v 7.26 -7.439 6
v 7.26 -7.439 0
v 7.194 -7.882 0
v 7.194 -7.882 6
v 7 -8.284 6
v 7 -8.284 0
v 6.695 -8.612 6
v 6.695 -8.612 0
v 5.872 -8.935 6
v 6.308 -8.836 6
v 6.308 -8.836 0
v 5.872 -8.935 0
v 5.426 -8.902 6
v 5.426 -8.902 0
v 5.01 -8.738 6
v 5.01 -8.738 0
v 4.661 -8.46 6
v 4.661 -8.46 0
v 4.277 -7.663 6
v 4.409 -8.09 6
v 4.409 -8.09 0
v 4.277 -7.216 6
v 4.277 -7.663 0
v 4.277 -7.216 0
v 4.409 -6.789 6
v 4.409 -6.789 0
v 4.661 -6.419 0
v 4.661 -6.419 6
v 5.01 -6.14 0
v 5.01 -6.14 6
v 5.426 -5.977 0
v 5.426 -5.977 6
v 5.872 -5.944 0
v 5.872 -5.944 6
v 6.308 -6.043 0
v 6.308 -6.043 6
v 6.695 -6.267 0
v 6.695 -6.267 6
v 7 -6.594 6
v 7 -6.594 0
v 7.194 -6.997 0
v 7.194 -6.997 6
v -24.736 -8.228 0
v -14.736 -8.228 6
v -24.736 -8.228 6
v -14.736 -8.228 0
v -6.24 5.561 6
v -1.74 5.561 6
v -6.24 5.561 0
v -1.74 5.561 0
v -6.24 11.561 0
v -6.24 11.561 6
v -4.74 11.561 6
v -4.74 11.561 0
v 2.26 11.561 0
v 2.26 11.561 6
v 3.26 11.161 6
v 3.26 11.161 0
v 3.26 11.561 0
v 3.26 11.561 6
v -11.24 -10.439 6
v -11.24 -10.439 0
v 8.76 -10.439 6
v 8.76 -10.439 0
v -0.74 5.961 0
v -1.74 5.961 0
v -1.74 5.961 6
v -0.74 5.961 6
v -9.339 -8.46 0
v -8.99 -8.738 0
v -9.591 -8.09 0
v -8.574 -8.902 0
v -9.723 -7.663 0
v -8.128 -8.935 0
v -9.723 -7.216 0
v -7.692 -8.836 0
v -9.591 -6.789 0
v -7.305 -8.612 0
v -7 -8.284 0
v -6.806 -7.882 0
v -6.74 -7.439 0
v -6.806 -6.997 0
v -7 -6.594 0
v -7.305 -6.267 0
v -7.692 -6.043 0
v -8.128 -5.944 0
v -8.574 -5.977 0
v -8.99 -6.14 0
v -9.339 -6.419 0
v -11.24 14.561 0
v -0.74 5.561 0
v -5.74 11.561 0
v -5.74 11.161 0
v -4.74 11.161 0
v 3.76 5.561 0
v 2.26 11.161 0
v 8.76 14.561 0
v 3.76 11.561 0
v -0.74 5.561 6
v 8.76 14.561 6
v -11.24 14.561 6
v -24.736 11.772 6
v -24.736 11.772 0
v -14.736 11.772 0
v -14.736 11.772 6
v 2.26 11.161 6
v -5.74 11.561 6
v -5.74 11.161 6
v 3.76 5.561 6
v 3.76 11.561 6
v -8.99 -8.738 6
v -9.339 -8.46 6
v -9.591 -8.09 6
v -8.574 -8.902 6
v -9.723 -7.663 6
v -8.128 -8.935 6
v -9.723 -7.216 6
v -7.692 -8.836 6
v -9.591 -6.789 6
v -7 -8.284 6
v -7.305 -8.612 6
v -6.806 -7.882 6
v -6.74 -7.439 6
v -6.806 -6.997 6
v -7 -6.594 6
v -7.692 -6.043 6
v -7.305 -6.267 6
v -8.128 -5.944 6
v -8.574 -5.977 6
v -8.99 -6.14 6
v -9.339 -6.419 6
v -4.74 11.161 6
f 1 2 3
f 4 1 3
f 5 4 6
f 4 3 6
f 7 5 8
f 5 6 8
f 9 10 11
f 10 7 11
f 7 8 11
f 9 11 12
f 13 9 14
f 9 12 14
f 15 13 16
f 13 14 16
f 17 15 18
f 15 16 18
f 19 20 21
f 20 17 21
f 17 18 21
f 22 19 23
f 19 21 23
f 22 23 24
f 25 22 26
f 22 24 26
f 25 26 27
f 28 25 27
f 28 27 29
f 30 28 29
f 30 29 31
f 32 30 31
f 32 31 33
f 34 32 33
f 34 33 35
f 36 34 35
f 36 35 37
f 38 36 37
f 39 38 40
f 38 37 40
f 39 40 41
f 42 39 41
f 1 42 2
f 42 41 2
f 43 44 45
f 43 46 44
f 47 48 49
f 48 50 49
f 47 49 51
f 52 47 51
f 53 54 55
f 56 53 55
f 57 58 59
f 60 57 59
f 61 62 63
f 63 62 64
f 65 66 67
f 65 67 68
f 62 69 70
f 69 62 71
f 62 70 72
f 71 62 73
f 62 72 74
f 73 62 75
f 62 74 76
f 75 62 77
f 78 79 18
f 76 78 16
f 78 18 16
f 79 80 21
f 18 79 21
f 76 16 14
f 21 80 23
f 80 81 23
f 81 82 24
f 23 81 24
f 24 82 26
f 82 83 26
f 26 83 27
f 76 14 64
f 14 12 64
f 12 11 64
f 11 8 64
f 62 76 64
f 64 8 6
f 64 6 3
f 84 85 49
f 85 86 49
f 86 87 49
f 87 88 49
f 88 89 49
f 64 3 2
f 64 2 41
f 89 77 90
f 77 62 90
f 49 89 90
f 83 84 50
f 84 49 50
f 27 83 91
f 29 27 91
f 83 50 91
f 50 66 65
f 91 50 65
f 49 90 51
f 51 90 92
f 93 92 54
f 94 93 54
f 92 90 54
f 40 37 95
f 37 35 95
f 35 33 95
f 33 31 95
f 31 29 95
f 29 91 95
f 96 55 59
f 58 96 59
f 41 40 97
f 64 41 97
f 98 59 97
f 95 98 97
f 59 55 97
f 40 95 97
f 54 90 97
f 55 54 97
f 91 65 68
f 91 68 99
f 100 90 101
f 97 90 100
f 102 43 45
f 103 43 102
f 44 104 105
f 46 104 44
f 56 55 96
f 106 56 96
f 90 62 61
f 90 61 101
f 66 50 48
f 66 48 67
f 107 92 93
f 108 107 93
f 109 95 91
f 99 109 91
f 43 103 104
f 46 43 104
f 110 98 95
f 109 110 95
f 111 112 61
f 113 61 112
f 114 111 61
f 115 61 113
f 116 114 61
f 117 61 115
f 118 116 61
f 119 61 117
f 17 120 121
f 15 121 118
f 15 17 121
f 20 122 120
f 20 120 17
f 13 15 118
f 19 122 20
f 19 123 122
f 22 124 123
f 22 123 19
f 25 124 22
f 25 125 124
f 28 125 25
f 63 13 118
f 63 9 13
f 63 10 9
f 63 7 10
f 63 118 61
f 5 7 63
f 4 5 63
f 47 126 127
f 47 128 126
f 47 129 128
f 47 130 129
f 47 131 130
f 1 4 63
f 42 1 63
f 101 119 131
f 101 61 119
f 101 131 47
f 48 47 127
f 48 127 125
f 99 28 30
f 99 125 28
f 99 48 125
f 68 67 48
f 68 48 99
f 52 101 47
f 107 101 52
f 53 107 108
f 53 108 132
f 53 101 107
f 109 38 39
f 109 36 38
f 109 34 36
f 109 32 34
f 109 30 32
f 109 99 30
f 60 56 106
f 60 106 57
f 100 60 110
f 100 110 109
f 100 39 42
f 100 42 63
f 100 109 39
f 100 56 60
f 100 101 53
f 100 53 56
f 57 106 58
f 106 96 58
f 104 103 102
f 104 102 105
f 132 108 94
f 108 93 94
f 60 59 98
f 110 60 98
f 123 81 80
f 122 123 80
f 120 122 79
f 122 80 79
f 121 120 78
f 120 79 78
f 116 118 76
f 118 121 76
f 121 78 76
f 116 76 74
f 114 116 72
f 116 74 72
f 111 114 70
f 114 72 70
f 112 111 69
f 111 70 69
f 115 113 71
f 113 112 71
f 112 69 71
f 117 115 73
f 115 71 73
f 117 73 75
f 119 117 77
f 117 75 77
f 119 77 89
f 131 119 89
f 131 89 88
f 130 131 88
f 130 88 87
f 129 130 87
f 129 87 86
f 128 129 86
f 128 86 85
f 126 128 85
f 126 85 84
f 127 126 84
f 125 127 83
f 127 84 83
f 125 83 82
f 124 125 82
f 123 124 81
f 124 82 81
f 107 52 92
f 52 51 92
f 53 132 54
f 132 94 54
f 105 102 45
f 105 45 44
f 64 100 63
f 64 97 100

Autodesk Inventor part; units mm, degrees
ref_plane "YZ Plane" through (0, 0, 0) normal (1, 0, 0) x (0, 1, 0)
ref_plane "XZ Plane" through (0, 0, 0) normal (0, 1, 0) x (-1, 0, 0)
ref_plane "XY Plane" through (0, 0, 0) normal (0, 0, 1) x (1, 0, 0)
sketch "Esquisse1" plane through (0, 0, 0) normal (0, 0, 1) x (1, 0, 0)
  line L0 (-11.2398, 14.5606) -> (8.7602, 14.5606)
  line L1 (8.7602, 14.5606) -> (8.7602, -10.4394)
  line L2 (-11.2398, -10.4394) -> (-11.2398, 14.5606)
  line L3 (-11.2398, 14.5606) -> (-1.2398, 14.5606) construction
  line L4 (-1.2398, 14.5606) -> (8.7602, 14.5606) construction
  line L5 (-1.2398, 5.1758) -> (-1.2398, -12.1236) construction
  line L6 (-6.2398, 11.5606) -> (3.7602, 11.5606)
  line L7 (3.7602, 11.5606) -> (3.7602, 5.5606)
  line L8 (3.7602, 5.5606) -> (-6.2398, 5.5606)
  line L9 (-6.2398, 5.5606) -> (-6.2398, 11.5606)
  line L10 (-24.7357, 11.7717) -> (-14.7357, 11.7717)
  line L11 (-14.7357, 11.7717) -> (-14.7357, -8.2283)
  line L12 (-14.7357, -8.2283) -> (-24.7357, -8.2283)
  line L13 (-24.7357, -8.2283) -> (-24.7357, 11.7717)
  line L14 (-5.7398, 11.5606) -> (-5.7398, 11.1606)
  line L15 (-5.7398, 11.1606) -> (-4.7398, 11.1606)
  line L16 (-4.7398, 11.1606) -> (-4.7398, 11.5606)
  line L17 (2.2602, 11.5606) -> (2.2602, 11.1606)
  line L18 (2.2602, 11.1606) -> (3.2602, 11.1606)
  line L19 (3.2602, 11.1606) -> (3.2602, 11.5606)
  line L20 (-1.7398, 5.5606) -> (-1.7398, 5.9606)
  line L21 (-1.7398, 5.9606) -> (-0.7398, 5.9606)
  line L22 (-0.7398, 5.9606) -> (-0.7398, 5.5606)
  line L23 (-6.2398, 11.5606) -> (-1.2398, 11.5606) construction
  line L24 (-1.2398, 11.5606) -> (3.7602, 11.5606) construction
  line L25 (-11.2398, -10.4394) -> (8.7602, -10.4394)
  circle A0 centre (-8.2398, -7.4394) radius 1.5
  circle A1 centre (5.7602, -7.4394) radius 1.5
  dimension "d0" = 20
  dimension "d2" = 25
  dimension "d3" = 6
  dimension "d4" = 3
  dimension "d5" = 10
  dimension "d6" = 10
  dimension "d7" = 20
  dimension "d8" = 1
  dimension "d9" = 0.4
  dimension "d10" = 0.4
  dimension "d11" = 0.5
  dimension "d12" = 0.5
  dimension "d13" = 4.5
  dimension "d18" = 3
  dimension "d19" = 3
  dimension "d20" = 3
extrude "Extrusion1" add sketch "Esquisse1" along normal blind 6 contours L0 L1 L25 L2 | L6 L16 L15 L14 | L20 L21 L22 L8 | L6 L19 L18 L17 | L10 L11 L12 L13
equation "\"d0\" = L_modules"
equation "\"d3\" = epaisseur_modules"
equation "\"d5\" = 0.5 * d0"
equation "\"d6\" = d5"
equation "\"d8\" = d15"
equation "\"d9\" = d16"
equation "\"d10\" = d16"
equation "\"d11\" = d17"
equation "\"d12\" = d17"
equation "\"d13\" = 0.5 * d5 - 0.5 * d8"
equation "\"d19\" = d20"
equation "\"d21\" = epaisseur_modules"
equation "\"d14\" = 8.2"
equation "\"d15\" = 1"
equation "\"d16\" = 0.4"
equation "\"d17\" = 0.5"
equation "\"epaisseur\" = 6"
equation "\"ecartement\" = 25"
equation "\"dvis\" = 3"
equation "\"largeur\" = 32"
equation "\"L_attache_carte\" = 15"
equation "\"marge_attache_carte\" = 5"
equation "\"L_cubi\" = 81.6"
equation "\"largeur_cubi\" = 81.6"
equation "\"L_moteur\" = 28.3"
equation "\"marge_trou\" = 2"
equation "\"taille_trou\" = 7"
equation "\"H_cubi\" = 81.6"
equation "\"epaisseur_wheel\" = 9"
equation "\"H_nez\" = 25"
equation "\"chanfrein\" = 0.5"
equation "\"H_trou_int\" = 0.5"
equation "\"L_trou_int\" = 1.2"
equation "\"pos_trou_int_1\" = 0.6"
equation "\"pos_trou_int_2\" = 2.9"
equation "\"epaisseur_modules\" = 6"
equation "\"L_modules\" = 20"
equation "\"L_metabois\" = 8.2"
equation "\"epaisseur_metabois\" = 3"
properties part number "attrape_ball"
